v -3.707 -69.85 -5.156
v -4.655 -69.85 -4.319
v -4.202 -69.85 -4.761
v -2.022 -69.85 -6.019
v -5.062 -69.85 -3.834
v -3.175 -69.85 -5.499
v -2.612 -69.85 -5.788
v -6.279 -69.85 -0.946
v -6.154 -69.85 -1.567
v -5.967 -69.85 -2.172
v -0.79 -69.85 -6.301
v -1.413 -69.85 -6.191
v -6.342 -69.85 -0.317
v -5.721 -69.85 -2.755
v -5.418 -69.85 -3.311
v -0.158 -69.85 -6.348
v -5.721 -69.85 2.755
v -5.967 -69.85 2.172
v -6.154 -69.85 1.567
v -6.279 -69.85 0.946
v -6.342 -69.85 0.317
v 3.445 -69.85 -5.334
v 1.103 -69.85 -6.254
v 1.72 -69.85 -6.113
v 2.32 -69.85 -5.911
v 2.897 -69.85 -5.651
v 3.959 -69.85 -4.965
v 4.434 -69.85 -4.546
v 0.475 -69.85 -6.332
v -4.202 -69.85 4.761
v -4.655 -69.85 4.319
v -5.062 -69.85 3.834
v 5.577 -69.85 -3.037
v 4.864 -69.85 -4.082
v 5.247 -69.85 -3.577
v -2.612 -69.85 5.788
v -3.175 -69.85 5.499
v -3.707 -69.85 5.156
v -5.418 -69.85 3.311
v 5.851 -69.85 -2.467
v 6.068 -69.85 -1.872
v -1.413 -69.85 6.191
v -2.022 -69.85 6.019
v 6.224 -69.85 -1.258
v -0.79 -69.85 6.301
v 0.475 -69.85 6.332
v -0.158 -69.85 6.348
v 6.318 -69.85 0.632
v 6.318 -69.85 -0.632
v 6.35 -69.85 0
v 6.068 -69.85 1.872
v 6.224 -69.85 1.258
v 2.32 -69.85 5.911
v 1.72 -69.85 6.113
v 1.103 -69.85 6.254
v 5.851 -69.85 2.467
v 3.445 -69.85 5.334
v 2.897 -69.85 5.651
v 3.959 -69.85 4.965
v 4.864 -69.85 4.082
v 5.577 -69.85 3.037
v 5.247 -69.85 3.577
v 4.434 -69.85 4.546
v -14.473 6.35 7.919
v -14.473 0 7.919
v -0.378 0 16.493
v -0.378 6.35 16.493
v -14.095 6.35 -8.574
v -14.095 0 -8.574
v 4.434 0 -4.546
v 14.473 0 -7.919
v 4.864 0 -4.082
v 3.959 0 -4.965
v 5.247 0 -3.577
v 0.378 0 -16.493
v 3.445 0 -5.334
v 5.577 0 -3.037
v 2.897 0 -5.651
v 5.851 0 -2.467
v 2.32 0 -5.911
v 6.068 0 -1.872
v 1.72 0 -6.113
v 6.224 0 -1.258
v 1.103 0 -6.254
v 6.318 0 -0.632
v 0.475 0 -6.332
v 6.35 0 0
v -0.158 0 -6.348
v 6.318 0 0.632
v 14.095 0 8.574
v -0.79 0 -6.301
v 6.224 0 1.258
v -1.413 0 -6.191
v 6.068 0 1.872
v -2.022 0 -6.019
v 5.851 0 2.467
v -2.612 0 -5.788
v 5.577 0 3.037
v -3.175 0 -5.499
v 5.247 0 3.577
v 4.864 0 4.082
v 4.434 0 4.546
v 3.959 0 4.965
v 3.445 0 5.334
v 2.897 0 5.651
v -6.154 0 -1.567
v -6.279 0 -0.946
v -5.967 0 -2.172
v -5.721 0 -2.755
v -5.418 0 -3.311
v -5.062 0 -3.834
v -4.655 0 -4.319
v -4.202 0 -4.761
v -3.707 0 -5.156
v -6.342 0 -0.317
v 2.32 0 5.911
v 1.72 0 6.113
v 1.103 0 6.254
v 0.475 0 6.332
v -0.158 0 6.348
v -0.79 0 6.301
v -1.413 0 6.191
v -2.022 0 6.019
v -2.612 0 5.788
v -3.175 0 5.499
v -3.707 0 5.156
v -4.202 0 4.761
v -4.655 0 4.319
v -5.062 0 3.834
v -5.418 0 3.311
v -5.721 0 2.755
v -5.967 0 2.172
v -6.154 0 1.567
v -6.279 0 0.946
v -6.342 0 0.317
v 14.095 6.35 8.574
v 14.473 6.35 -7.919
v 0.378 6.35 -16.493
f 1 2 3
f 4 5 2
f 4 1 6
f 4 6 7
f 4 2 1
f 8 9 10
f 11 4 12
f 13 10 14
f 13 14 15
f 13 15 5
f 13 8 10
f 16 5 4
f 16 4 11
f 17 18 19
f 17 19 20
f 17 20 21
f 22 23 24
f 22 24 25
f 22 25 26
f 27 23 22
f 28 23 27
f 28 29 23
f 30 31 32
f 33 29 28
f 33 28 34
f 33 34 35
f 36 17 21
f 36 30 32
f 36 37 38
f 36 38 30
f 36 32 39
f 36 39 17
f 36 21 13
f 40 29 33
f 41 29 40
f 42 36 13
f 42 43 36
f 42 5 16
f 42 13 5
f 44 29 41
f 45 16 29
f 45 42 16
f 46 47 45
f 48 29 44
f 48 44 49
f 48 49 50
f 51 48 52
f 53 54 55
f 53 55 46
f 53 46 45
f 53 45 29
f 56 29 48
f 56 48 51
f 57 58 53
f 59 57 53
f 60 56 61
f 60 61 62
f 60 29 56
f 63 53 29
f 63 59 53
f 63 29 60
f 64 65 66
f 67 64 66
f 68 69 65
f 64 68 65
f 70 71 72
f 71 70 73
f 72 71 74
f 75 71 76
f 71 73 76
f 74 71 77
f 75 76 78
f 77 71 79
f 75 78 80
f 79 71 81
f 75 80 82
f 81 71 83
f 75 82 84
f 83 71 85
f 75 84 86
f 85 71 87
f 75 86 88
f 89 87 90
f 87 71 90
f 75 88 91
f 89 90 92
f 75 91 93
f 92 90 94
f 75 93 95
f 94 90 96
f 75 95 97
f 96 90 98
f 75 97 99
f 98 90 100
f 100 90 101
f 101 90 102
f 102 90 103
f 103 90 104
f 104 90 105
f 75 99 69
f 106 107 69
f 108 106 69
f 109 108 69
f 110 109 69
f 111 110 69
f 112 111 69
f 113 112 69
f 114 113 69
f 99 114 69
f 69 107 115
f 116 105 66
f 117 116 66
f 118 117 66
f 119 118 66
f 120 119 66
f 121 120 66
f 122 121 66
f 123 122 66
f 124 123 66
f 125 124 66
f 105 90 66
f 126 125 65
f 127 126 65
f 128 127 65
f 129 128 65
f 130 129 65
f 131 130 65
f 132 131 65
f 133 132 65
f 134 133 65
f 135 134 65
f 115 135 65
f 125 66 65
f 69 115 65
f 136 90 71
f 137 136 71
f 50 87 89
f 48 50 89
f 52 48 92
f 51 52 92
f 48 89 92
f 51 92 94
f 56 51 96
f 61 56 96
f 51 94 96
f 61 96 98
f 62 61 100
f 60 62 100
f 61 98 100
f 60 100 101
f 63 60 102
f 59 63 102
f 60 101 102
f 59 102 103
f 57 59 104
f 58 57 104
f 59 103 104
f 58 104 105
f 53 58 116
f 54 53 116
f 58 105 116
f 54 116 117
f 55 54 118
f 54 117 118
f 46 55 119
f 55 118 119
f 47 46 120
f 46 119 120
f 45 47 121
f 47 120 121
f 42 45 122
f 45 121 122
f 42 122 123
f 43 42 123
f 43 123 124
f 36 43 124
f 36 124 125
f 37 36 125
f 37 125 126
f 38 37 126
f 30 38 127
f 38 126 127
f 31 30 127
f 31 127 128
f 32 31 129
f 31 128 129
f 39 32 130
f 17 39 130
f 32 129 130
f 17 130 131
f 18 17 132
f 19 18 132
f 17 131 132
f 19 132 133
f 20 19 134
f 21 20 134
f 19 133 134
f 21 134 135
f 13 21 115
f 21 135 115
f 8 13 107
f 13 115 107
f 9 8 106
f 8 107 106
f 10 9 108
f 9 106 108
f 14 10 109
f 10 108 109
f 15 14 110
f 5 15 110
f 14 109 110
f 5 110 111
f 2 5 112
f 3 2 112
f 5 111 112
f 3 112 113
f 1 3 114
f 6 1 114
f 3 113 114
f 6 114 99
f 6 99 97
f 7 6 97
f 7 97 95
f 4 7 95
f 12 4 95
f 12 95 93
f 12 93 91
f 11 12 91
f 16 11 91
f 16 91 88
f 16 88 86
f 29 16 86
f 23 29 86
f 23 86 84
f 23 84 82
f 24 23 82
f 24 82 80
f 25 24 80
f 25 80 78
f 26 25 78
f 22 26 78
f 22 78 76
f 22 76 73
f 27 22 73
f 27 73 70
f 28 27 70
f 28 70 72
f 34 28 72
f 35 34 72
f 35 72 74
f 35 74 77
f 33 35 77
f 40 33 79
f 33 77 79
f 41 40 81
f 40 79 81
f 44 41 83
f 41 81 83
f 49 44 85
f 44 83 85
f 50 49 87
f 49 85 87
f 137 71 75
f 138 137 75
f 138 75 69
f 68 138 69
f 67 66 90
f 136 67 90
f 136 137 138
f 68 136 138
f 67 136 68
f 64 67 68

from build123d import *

# Parameters (mm, degrees)
F0_R     = 6.35
F1_DEPTH = 69.85
F2_R     = 6.35
F3_DEPTH = 6.35


with BuildPart() as f1:
    # F0 (on Front) → F1 (new body)
    with BuildSketch(Plane.XZ):
        Circle(F0_R)
    extrude(amount=F1_DEPTH)

    # F2 (on face) → F3 (join)
    with BuildSketch(Plane(origin=(0, 0, 0), x_dir=(-1, 0, 0), z_dir=(0, 1, 0))):
        Polygon((14.4728282073, 7.9192246264), (0.3781643989, 16.4934492053), (-14.0946638083, 8.5742245789), (-14.4728282073, -7.9192246264), (-0.3781643989, -16.4934492053), (14.0946638083, -8.5742245789), align=None)
        Circle(F2_R, mode=Mode.SUBTRACT)
        Circle(F2_R)
    extrude(amount=F3_DEPTH)


solid = f1.part
